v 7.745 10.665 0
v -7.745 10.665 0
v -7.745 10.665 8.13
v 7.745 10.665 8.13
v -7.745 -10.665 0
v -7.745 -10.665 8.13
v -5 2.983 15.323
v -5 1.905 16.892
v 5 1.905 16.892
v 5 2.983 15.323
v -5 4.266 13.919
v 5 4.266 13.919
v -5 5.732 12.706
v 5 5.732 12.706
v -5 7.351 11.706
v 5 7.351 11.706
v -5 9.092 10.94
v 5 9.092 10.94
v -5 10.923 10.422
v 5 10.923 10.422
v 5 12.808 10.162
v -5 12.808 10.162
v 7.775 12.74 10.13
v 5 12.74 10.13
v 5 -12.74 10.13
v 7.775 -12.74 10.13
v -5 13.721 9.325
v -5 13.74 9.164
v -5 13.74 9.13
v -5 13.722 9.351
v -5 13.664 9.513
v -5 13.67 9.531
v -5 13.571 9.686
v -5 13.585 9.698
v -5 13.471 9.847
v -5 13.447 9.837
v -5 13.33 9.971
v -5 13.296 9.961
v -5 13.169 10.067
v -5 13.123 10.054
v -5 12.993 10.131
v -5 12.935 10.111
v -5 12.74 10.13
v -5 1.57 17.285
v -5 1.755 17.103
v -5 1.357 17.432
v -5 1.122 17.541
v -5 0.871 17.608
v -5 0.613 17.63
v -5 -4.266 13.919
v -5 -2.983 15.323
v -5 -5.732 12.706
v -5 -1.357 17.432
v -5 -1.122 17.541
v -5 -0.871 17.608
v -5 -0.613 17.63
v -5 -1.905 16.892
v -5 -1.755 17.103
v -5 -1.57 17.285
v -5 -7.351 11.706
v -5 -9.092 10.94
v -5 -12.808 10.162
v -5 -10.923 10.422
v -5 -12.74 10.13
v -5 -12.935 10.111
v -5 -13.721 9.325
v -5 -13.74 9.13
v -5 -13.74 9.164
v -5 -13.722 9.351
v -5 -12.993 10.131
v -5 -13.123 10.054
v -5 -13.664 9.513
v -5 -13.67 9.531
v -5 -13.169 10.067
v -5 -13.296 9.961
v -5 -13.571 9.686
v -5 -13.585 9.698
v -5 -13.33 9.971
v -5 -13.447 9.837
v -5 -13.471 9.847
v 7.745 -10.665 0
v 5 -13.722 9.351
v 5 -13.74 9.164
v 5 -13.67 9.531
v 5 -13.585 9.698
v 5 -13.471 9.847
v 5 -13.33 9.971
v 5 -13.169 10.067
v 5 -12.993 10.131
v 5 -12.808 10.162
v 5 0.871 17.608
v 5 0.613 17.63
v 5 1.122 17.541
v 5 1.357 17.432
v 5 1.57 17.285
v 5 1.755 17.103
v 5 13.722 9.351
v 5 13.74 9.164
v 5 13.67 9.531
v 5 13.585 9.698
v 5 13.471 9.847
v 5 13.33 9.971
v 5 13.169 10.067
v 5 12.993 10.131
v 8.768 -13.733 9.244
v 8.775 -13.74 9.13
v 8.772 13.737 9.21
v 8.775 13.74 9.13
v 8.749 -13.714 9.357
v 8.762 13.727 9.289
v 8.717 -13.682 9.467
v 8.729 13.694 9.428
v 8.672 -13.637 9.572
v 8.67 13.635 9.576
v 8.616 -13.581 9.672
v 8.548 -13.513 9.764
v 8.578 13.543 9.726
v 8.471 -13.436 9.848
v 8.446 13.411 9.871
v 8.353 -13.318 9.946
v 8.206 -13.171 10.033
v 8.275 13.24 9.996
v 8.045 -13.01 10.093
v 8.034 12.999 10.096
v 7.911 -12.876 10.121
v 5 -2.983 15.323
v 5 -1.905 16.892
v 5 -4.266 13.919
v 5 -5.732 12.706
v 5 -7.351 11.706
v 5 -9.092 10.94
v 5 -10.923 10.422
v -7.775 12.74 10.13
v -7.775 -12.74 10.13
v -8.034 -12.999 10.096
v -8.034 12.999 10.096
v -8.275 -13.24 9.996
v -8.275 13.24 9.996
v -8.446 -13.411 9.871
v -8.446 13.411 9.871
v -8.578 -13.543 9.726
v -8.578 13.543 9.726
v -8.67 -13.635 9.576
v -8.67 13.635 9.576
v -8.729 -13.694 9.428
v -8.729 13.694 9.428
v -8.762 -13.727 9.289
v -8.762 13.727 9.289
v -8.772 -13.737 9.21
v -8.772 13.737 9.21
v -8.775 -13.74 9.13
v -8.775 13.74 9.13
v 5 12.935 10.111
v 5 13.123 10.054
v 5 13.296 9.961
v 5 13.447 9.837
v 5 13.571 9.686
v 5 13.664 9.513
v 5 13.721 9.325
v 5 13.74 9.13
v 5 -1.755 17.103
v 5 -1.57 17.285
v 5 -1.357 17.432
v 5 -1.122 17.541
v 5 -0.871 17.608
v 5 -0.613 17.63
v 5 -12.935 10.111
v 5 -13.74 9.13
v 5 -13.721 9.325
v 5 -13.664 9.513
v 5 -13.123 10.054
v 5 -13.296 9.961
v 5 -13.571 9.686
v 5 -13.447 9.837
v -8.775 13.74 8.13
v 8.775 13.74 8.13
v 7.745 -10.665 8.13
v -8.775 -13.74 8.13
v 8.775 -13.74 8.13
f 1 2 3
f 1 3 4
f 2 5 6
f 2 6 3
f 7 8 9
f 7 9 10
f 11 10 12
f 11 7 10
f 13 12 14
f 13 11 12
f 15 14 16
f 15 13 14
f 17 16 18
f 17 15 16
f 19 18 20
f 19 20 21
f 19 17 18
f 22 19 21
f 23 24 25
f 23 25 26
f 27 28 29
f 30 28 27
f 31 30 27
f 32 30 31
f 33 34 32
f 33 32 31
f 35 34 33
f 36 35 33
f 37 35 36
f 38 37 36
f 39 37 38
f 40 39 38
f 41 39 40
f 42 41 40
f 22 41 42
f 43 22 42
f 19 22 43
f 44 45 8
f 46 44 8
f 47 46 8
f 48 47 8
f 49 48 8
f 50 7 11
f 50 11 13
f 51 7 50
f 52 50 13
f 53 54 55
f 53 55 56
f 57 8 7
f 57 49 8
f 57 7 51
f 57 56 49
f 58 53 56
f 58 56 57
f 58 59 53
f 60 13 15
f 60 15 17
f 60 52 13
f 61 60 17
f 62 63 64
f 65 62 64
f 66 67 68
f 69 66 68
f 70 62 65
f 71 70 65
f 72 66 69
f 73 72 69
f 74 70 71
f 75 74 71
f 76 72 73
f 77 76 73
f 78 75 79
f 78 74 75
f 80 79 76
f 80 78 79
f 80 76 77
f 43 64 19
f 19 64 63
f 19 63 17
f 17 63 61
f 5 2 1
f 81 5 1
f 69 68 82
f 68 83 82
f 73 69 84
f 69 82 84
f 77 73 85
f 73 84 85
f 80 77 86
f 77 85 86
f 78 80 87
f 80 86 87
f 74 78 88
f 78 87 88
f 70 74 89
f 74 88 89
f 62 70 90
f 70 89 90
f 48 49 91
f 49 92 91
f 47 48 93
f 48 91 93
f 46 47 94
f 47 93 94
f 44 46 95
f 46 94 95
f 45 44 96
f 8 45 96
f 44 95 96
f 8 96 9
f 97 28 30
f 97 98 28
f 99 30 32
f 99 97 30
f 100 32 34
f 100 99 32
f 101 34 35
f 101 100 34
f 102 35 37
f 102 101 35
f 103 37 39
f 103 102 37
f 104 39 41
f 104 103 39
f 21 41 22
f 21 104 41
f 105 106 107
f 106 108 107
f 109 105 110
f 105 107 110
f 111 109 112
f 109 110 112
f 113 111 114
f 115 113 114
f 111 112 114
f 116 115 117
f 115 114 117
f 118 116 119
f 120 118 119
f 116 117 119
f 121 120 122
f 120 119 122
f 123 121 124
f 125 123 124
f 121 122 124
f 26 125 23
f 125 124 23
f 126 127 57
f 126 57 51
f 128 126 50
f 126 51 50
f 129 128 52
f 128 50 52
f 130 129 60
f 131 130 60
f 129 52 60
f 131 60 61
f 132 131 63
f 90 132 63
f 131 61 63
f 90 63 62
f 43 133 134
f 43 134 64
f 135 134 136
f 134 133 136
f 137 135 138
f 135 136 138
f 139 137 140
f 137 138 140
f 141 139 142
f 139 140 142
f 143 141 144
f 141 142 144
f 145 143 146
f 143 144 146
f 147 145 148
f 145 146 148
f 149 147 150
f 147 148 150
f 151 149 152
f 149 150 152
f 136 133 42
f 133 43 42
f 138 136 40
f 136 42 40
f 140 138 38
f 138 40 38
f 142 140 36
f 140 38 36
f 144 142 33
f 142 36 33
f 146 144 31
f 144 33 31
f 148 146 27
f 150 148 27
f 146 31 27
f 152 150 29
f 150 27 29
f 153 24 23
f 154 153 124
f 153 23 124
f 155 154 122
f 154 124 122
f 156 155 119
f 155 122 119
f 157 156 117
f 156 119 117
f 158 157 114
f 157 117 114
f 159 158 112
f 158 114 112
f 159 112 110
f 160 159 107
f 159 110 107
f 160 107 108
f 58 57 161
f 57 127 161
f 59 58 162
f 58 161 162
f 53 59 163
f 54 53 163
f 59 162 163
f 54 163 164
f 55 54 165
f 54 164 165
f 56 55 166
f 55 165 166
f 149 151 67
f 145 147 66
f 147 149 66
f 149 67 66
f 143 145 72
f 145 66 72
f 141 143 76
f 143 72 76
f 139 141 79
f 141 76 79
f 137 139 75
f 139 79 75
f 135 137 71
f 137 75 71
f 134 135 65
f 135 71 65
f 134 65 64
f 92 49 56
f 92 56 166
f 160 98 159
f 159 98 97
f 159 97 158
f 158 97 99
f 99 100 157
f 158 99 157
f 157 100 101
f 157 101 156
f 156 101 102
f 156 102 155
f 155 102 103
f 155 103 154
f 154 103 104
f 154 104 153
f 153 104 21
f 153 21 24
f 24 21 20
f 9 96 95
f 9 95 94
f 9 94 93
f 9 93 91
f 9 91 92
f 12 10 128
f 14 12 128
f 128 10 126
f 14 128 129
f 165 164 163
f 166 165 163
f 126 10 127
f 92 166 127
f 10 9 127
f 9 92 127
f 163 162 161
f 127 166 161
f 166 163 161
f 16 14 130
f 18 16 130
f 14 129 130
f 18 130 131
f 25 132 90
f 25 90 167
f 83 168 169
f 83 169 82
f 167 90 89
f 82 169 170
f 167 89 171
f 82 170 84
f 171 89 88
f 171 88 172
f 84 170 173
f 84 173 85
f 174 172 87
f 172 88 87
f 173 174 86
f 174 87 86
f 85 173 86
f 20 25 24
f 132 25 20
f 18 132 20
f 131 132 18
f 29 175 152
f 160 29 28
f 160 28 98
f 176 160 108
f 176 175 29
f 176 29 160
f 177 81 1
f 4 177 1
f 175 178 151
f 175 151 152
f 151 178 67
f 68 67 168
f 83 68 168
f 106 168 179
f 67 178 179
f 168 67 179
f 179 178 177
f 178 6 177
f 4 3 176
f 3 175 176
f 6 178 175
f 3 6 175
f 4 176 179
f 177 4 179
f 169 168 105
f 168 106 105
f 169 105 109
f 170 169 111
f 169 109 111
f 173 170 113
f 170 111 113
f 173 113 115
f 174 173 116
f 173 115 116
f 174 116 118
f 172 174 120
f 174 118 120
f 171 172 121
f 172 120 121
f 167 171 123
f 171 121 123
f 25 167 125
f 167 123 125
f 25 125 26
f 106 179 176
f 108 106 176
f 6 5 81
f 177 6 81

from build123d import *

# Parameters (mm, degrees)
SKETCH_W     = 15.49
SKETCH_H     = 21.33
PAD_DEPTH    = 8.13
SKETCH001_W  = 17.55
SKETCH001_H  = 27.48
PAD001_DEPTH = 2
SKETCH002_W  = 10
SKETCH002_H  = 3
PAD002_DEPTH = 7.5
PAD003_DEPTH = 10
FILLET_R     = 1
FILLET001_R  = 1
FILLET002_R  = 1.5


with BuildPart() as part:
    # Sketch → Pad (new body)
    with BuildSketch(Plane.XY):
        Rectangle(SKETCH_W, SKETCH_H)
    extrude(amount=PAD_DEPTH)

    # Sketch001 (on Face6 of Pad) → Pad001 (join)
    with BuildSketch(Plane.XY.offset(8.13)):
        Rectangle(SKETCH001_W, SKETCH001_H)
    extrude(amount=PAD001_DEPTH)

    # Sketch002 (on Face5 of Pad001) → Pad002 (join)
    with BuildSketch(Plane.XY.offset(10.13)):
        Rectangle(SKETCH002_W, SKETCH002_H)
    extrude(amount=PAD002_DEPTH)

    # Sketch003 (on Face14 of Pad002) → Pad003 (join)
    with BuildSketch(Plane(origin=(-5, 0, 0), x_dir=(0, -1, 0), z_dir=(-1, 0, 0))):
        with BuildLine():
            ThreePointArc((1.5, 17.63), (6.562473, 12.154115), (13.74, 10.13))
            Line((1.5, 10.13), (13.74, 10.13))
            Line((1.5, 17.63), (1.5, 10.13))
        make_face()
    pad003 = extrude(amount=-PAD003_DEPTH)

    # Mirrored: Pad003 across Sketch003 V_Axis
    add(pad003.mirror(Plane(origin=(-5, 0, 0), x_dir=(-1, 0, 0), z_dir=(0, -1, 0))))

    # Fillet
    fillet_edges = [part.edges().sort_by_distance(p)[0] for p in [
        (-8.775, 0, 10.13),
        (-6.8875, -13.74, 10.13),
        (-6.8875, 13.74, 10.13),
        (6.8875, 13.74, 10.13),
        (6.8875, -13.74, 10.13),
        (8.775, 0, 10.13),
    ]]
    fillet(fillet_edges, radius=FILLET_R)

    # Fillet001
    fillet001_edges = [part.edges().sort_by_distance(p)[0] for p in [
        (0, -13.74, 10.13),
        (0, 13.74, 10.13),
    ]]
    fillet(fillet001_edges, radius=FILLET001_R)

    # Fillet002
    fillet002_edges = [part.edges().sort_by_distance(p)[0] for p in [
        (0, 1.5, 17.63),
        (0, -1.5, 17.63),
    ]]
    fillet(fillet002_edges, radius=FILLET002_R)


solid = part.part
